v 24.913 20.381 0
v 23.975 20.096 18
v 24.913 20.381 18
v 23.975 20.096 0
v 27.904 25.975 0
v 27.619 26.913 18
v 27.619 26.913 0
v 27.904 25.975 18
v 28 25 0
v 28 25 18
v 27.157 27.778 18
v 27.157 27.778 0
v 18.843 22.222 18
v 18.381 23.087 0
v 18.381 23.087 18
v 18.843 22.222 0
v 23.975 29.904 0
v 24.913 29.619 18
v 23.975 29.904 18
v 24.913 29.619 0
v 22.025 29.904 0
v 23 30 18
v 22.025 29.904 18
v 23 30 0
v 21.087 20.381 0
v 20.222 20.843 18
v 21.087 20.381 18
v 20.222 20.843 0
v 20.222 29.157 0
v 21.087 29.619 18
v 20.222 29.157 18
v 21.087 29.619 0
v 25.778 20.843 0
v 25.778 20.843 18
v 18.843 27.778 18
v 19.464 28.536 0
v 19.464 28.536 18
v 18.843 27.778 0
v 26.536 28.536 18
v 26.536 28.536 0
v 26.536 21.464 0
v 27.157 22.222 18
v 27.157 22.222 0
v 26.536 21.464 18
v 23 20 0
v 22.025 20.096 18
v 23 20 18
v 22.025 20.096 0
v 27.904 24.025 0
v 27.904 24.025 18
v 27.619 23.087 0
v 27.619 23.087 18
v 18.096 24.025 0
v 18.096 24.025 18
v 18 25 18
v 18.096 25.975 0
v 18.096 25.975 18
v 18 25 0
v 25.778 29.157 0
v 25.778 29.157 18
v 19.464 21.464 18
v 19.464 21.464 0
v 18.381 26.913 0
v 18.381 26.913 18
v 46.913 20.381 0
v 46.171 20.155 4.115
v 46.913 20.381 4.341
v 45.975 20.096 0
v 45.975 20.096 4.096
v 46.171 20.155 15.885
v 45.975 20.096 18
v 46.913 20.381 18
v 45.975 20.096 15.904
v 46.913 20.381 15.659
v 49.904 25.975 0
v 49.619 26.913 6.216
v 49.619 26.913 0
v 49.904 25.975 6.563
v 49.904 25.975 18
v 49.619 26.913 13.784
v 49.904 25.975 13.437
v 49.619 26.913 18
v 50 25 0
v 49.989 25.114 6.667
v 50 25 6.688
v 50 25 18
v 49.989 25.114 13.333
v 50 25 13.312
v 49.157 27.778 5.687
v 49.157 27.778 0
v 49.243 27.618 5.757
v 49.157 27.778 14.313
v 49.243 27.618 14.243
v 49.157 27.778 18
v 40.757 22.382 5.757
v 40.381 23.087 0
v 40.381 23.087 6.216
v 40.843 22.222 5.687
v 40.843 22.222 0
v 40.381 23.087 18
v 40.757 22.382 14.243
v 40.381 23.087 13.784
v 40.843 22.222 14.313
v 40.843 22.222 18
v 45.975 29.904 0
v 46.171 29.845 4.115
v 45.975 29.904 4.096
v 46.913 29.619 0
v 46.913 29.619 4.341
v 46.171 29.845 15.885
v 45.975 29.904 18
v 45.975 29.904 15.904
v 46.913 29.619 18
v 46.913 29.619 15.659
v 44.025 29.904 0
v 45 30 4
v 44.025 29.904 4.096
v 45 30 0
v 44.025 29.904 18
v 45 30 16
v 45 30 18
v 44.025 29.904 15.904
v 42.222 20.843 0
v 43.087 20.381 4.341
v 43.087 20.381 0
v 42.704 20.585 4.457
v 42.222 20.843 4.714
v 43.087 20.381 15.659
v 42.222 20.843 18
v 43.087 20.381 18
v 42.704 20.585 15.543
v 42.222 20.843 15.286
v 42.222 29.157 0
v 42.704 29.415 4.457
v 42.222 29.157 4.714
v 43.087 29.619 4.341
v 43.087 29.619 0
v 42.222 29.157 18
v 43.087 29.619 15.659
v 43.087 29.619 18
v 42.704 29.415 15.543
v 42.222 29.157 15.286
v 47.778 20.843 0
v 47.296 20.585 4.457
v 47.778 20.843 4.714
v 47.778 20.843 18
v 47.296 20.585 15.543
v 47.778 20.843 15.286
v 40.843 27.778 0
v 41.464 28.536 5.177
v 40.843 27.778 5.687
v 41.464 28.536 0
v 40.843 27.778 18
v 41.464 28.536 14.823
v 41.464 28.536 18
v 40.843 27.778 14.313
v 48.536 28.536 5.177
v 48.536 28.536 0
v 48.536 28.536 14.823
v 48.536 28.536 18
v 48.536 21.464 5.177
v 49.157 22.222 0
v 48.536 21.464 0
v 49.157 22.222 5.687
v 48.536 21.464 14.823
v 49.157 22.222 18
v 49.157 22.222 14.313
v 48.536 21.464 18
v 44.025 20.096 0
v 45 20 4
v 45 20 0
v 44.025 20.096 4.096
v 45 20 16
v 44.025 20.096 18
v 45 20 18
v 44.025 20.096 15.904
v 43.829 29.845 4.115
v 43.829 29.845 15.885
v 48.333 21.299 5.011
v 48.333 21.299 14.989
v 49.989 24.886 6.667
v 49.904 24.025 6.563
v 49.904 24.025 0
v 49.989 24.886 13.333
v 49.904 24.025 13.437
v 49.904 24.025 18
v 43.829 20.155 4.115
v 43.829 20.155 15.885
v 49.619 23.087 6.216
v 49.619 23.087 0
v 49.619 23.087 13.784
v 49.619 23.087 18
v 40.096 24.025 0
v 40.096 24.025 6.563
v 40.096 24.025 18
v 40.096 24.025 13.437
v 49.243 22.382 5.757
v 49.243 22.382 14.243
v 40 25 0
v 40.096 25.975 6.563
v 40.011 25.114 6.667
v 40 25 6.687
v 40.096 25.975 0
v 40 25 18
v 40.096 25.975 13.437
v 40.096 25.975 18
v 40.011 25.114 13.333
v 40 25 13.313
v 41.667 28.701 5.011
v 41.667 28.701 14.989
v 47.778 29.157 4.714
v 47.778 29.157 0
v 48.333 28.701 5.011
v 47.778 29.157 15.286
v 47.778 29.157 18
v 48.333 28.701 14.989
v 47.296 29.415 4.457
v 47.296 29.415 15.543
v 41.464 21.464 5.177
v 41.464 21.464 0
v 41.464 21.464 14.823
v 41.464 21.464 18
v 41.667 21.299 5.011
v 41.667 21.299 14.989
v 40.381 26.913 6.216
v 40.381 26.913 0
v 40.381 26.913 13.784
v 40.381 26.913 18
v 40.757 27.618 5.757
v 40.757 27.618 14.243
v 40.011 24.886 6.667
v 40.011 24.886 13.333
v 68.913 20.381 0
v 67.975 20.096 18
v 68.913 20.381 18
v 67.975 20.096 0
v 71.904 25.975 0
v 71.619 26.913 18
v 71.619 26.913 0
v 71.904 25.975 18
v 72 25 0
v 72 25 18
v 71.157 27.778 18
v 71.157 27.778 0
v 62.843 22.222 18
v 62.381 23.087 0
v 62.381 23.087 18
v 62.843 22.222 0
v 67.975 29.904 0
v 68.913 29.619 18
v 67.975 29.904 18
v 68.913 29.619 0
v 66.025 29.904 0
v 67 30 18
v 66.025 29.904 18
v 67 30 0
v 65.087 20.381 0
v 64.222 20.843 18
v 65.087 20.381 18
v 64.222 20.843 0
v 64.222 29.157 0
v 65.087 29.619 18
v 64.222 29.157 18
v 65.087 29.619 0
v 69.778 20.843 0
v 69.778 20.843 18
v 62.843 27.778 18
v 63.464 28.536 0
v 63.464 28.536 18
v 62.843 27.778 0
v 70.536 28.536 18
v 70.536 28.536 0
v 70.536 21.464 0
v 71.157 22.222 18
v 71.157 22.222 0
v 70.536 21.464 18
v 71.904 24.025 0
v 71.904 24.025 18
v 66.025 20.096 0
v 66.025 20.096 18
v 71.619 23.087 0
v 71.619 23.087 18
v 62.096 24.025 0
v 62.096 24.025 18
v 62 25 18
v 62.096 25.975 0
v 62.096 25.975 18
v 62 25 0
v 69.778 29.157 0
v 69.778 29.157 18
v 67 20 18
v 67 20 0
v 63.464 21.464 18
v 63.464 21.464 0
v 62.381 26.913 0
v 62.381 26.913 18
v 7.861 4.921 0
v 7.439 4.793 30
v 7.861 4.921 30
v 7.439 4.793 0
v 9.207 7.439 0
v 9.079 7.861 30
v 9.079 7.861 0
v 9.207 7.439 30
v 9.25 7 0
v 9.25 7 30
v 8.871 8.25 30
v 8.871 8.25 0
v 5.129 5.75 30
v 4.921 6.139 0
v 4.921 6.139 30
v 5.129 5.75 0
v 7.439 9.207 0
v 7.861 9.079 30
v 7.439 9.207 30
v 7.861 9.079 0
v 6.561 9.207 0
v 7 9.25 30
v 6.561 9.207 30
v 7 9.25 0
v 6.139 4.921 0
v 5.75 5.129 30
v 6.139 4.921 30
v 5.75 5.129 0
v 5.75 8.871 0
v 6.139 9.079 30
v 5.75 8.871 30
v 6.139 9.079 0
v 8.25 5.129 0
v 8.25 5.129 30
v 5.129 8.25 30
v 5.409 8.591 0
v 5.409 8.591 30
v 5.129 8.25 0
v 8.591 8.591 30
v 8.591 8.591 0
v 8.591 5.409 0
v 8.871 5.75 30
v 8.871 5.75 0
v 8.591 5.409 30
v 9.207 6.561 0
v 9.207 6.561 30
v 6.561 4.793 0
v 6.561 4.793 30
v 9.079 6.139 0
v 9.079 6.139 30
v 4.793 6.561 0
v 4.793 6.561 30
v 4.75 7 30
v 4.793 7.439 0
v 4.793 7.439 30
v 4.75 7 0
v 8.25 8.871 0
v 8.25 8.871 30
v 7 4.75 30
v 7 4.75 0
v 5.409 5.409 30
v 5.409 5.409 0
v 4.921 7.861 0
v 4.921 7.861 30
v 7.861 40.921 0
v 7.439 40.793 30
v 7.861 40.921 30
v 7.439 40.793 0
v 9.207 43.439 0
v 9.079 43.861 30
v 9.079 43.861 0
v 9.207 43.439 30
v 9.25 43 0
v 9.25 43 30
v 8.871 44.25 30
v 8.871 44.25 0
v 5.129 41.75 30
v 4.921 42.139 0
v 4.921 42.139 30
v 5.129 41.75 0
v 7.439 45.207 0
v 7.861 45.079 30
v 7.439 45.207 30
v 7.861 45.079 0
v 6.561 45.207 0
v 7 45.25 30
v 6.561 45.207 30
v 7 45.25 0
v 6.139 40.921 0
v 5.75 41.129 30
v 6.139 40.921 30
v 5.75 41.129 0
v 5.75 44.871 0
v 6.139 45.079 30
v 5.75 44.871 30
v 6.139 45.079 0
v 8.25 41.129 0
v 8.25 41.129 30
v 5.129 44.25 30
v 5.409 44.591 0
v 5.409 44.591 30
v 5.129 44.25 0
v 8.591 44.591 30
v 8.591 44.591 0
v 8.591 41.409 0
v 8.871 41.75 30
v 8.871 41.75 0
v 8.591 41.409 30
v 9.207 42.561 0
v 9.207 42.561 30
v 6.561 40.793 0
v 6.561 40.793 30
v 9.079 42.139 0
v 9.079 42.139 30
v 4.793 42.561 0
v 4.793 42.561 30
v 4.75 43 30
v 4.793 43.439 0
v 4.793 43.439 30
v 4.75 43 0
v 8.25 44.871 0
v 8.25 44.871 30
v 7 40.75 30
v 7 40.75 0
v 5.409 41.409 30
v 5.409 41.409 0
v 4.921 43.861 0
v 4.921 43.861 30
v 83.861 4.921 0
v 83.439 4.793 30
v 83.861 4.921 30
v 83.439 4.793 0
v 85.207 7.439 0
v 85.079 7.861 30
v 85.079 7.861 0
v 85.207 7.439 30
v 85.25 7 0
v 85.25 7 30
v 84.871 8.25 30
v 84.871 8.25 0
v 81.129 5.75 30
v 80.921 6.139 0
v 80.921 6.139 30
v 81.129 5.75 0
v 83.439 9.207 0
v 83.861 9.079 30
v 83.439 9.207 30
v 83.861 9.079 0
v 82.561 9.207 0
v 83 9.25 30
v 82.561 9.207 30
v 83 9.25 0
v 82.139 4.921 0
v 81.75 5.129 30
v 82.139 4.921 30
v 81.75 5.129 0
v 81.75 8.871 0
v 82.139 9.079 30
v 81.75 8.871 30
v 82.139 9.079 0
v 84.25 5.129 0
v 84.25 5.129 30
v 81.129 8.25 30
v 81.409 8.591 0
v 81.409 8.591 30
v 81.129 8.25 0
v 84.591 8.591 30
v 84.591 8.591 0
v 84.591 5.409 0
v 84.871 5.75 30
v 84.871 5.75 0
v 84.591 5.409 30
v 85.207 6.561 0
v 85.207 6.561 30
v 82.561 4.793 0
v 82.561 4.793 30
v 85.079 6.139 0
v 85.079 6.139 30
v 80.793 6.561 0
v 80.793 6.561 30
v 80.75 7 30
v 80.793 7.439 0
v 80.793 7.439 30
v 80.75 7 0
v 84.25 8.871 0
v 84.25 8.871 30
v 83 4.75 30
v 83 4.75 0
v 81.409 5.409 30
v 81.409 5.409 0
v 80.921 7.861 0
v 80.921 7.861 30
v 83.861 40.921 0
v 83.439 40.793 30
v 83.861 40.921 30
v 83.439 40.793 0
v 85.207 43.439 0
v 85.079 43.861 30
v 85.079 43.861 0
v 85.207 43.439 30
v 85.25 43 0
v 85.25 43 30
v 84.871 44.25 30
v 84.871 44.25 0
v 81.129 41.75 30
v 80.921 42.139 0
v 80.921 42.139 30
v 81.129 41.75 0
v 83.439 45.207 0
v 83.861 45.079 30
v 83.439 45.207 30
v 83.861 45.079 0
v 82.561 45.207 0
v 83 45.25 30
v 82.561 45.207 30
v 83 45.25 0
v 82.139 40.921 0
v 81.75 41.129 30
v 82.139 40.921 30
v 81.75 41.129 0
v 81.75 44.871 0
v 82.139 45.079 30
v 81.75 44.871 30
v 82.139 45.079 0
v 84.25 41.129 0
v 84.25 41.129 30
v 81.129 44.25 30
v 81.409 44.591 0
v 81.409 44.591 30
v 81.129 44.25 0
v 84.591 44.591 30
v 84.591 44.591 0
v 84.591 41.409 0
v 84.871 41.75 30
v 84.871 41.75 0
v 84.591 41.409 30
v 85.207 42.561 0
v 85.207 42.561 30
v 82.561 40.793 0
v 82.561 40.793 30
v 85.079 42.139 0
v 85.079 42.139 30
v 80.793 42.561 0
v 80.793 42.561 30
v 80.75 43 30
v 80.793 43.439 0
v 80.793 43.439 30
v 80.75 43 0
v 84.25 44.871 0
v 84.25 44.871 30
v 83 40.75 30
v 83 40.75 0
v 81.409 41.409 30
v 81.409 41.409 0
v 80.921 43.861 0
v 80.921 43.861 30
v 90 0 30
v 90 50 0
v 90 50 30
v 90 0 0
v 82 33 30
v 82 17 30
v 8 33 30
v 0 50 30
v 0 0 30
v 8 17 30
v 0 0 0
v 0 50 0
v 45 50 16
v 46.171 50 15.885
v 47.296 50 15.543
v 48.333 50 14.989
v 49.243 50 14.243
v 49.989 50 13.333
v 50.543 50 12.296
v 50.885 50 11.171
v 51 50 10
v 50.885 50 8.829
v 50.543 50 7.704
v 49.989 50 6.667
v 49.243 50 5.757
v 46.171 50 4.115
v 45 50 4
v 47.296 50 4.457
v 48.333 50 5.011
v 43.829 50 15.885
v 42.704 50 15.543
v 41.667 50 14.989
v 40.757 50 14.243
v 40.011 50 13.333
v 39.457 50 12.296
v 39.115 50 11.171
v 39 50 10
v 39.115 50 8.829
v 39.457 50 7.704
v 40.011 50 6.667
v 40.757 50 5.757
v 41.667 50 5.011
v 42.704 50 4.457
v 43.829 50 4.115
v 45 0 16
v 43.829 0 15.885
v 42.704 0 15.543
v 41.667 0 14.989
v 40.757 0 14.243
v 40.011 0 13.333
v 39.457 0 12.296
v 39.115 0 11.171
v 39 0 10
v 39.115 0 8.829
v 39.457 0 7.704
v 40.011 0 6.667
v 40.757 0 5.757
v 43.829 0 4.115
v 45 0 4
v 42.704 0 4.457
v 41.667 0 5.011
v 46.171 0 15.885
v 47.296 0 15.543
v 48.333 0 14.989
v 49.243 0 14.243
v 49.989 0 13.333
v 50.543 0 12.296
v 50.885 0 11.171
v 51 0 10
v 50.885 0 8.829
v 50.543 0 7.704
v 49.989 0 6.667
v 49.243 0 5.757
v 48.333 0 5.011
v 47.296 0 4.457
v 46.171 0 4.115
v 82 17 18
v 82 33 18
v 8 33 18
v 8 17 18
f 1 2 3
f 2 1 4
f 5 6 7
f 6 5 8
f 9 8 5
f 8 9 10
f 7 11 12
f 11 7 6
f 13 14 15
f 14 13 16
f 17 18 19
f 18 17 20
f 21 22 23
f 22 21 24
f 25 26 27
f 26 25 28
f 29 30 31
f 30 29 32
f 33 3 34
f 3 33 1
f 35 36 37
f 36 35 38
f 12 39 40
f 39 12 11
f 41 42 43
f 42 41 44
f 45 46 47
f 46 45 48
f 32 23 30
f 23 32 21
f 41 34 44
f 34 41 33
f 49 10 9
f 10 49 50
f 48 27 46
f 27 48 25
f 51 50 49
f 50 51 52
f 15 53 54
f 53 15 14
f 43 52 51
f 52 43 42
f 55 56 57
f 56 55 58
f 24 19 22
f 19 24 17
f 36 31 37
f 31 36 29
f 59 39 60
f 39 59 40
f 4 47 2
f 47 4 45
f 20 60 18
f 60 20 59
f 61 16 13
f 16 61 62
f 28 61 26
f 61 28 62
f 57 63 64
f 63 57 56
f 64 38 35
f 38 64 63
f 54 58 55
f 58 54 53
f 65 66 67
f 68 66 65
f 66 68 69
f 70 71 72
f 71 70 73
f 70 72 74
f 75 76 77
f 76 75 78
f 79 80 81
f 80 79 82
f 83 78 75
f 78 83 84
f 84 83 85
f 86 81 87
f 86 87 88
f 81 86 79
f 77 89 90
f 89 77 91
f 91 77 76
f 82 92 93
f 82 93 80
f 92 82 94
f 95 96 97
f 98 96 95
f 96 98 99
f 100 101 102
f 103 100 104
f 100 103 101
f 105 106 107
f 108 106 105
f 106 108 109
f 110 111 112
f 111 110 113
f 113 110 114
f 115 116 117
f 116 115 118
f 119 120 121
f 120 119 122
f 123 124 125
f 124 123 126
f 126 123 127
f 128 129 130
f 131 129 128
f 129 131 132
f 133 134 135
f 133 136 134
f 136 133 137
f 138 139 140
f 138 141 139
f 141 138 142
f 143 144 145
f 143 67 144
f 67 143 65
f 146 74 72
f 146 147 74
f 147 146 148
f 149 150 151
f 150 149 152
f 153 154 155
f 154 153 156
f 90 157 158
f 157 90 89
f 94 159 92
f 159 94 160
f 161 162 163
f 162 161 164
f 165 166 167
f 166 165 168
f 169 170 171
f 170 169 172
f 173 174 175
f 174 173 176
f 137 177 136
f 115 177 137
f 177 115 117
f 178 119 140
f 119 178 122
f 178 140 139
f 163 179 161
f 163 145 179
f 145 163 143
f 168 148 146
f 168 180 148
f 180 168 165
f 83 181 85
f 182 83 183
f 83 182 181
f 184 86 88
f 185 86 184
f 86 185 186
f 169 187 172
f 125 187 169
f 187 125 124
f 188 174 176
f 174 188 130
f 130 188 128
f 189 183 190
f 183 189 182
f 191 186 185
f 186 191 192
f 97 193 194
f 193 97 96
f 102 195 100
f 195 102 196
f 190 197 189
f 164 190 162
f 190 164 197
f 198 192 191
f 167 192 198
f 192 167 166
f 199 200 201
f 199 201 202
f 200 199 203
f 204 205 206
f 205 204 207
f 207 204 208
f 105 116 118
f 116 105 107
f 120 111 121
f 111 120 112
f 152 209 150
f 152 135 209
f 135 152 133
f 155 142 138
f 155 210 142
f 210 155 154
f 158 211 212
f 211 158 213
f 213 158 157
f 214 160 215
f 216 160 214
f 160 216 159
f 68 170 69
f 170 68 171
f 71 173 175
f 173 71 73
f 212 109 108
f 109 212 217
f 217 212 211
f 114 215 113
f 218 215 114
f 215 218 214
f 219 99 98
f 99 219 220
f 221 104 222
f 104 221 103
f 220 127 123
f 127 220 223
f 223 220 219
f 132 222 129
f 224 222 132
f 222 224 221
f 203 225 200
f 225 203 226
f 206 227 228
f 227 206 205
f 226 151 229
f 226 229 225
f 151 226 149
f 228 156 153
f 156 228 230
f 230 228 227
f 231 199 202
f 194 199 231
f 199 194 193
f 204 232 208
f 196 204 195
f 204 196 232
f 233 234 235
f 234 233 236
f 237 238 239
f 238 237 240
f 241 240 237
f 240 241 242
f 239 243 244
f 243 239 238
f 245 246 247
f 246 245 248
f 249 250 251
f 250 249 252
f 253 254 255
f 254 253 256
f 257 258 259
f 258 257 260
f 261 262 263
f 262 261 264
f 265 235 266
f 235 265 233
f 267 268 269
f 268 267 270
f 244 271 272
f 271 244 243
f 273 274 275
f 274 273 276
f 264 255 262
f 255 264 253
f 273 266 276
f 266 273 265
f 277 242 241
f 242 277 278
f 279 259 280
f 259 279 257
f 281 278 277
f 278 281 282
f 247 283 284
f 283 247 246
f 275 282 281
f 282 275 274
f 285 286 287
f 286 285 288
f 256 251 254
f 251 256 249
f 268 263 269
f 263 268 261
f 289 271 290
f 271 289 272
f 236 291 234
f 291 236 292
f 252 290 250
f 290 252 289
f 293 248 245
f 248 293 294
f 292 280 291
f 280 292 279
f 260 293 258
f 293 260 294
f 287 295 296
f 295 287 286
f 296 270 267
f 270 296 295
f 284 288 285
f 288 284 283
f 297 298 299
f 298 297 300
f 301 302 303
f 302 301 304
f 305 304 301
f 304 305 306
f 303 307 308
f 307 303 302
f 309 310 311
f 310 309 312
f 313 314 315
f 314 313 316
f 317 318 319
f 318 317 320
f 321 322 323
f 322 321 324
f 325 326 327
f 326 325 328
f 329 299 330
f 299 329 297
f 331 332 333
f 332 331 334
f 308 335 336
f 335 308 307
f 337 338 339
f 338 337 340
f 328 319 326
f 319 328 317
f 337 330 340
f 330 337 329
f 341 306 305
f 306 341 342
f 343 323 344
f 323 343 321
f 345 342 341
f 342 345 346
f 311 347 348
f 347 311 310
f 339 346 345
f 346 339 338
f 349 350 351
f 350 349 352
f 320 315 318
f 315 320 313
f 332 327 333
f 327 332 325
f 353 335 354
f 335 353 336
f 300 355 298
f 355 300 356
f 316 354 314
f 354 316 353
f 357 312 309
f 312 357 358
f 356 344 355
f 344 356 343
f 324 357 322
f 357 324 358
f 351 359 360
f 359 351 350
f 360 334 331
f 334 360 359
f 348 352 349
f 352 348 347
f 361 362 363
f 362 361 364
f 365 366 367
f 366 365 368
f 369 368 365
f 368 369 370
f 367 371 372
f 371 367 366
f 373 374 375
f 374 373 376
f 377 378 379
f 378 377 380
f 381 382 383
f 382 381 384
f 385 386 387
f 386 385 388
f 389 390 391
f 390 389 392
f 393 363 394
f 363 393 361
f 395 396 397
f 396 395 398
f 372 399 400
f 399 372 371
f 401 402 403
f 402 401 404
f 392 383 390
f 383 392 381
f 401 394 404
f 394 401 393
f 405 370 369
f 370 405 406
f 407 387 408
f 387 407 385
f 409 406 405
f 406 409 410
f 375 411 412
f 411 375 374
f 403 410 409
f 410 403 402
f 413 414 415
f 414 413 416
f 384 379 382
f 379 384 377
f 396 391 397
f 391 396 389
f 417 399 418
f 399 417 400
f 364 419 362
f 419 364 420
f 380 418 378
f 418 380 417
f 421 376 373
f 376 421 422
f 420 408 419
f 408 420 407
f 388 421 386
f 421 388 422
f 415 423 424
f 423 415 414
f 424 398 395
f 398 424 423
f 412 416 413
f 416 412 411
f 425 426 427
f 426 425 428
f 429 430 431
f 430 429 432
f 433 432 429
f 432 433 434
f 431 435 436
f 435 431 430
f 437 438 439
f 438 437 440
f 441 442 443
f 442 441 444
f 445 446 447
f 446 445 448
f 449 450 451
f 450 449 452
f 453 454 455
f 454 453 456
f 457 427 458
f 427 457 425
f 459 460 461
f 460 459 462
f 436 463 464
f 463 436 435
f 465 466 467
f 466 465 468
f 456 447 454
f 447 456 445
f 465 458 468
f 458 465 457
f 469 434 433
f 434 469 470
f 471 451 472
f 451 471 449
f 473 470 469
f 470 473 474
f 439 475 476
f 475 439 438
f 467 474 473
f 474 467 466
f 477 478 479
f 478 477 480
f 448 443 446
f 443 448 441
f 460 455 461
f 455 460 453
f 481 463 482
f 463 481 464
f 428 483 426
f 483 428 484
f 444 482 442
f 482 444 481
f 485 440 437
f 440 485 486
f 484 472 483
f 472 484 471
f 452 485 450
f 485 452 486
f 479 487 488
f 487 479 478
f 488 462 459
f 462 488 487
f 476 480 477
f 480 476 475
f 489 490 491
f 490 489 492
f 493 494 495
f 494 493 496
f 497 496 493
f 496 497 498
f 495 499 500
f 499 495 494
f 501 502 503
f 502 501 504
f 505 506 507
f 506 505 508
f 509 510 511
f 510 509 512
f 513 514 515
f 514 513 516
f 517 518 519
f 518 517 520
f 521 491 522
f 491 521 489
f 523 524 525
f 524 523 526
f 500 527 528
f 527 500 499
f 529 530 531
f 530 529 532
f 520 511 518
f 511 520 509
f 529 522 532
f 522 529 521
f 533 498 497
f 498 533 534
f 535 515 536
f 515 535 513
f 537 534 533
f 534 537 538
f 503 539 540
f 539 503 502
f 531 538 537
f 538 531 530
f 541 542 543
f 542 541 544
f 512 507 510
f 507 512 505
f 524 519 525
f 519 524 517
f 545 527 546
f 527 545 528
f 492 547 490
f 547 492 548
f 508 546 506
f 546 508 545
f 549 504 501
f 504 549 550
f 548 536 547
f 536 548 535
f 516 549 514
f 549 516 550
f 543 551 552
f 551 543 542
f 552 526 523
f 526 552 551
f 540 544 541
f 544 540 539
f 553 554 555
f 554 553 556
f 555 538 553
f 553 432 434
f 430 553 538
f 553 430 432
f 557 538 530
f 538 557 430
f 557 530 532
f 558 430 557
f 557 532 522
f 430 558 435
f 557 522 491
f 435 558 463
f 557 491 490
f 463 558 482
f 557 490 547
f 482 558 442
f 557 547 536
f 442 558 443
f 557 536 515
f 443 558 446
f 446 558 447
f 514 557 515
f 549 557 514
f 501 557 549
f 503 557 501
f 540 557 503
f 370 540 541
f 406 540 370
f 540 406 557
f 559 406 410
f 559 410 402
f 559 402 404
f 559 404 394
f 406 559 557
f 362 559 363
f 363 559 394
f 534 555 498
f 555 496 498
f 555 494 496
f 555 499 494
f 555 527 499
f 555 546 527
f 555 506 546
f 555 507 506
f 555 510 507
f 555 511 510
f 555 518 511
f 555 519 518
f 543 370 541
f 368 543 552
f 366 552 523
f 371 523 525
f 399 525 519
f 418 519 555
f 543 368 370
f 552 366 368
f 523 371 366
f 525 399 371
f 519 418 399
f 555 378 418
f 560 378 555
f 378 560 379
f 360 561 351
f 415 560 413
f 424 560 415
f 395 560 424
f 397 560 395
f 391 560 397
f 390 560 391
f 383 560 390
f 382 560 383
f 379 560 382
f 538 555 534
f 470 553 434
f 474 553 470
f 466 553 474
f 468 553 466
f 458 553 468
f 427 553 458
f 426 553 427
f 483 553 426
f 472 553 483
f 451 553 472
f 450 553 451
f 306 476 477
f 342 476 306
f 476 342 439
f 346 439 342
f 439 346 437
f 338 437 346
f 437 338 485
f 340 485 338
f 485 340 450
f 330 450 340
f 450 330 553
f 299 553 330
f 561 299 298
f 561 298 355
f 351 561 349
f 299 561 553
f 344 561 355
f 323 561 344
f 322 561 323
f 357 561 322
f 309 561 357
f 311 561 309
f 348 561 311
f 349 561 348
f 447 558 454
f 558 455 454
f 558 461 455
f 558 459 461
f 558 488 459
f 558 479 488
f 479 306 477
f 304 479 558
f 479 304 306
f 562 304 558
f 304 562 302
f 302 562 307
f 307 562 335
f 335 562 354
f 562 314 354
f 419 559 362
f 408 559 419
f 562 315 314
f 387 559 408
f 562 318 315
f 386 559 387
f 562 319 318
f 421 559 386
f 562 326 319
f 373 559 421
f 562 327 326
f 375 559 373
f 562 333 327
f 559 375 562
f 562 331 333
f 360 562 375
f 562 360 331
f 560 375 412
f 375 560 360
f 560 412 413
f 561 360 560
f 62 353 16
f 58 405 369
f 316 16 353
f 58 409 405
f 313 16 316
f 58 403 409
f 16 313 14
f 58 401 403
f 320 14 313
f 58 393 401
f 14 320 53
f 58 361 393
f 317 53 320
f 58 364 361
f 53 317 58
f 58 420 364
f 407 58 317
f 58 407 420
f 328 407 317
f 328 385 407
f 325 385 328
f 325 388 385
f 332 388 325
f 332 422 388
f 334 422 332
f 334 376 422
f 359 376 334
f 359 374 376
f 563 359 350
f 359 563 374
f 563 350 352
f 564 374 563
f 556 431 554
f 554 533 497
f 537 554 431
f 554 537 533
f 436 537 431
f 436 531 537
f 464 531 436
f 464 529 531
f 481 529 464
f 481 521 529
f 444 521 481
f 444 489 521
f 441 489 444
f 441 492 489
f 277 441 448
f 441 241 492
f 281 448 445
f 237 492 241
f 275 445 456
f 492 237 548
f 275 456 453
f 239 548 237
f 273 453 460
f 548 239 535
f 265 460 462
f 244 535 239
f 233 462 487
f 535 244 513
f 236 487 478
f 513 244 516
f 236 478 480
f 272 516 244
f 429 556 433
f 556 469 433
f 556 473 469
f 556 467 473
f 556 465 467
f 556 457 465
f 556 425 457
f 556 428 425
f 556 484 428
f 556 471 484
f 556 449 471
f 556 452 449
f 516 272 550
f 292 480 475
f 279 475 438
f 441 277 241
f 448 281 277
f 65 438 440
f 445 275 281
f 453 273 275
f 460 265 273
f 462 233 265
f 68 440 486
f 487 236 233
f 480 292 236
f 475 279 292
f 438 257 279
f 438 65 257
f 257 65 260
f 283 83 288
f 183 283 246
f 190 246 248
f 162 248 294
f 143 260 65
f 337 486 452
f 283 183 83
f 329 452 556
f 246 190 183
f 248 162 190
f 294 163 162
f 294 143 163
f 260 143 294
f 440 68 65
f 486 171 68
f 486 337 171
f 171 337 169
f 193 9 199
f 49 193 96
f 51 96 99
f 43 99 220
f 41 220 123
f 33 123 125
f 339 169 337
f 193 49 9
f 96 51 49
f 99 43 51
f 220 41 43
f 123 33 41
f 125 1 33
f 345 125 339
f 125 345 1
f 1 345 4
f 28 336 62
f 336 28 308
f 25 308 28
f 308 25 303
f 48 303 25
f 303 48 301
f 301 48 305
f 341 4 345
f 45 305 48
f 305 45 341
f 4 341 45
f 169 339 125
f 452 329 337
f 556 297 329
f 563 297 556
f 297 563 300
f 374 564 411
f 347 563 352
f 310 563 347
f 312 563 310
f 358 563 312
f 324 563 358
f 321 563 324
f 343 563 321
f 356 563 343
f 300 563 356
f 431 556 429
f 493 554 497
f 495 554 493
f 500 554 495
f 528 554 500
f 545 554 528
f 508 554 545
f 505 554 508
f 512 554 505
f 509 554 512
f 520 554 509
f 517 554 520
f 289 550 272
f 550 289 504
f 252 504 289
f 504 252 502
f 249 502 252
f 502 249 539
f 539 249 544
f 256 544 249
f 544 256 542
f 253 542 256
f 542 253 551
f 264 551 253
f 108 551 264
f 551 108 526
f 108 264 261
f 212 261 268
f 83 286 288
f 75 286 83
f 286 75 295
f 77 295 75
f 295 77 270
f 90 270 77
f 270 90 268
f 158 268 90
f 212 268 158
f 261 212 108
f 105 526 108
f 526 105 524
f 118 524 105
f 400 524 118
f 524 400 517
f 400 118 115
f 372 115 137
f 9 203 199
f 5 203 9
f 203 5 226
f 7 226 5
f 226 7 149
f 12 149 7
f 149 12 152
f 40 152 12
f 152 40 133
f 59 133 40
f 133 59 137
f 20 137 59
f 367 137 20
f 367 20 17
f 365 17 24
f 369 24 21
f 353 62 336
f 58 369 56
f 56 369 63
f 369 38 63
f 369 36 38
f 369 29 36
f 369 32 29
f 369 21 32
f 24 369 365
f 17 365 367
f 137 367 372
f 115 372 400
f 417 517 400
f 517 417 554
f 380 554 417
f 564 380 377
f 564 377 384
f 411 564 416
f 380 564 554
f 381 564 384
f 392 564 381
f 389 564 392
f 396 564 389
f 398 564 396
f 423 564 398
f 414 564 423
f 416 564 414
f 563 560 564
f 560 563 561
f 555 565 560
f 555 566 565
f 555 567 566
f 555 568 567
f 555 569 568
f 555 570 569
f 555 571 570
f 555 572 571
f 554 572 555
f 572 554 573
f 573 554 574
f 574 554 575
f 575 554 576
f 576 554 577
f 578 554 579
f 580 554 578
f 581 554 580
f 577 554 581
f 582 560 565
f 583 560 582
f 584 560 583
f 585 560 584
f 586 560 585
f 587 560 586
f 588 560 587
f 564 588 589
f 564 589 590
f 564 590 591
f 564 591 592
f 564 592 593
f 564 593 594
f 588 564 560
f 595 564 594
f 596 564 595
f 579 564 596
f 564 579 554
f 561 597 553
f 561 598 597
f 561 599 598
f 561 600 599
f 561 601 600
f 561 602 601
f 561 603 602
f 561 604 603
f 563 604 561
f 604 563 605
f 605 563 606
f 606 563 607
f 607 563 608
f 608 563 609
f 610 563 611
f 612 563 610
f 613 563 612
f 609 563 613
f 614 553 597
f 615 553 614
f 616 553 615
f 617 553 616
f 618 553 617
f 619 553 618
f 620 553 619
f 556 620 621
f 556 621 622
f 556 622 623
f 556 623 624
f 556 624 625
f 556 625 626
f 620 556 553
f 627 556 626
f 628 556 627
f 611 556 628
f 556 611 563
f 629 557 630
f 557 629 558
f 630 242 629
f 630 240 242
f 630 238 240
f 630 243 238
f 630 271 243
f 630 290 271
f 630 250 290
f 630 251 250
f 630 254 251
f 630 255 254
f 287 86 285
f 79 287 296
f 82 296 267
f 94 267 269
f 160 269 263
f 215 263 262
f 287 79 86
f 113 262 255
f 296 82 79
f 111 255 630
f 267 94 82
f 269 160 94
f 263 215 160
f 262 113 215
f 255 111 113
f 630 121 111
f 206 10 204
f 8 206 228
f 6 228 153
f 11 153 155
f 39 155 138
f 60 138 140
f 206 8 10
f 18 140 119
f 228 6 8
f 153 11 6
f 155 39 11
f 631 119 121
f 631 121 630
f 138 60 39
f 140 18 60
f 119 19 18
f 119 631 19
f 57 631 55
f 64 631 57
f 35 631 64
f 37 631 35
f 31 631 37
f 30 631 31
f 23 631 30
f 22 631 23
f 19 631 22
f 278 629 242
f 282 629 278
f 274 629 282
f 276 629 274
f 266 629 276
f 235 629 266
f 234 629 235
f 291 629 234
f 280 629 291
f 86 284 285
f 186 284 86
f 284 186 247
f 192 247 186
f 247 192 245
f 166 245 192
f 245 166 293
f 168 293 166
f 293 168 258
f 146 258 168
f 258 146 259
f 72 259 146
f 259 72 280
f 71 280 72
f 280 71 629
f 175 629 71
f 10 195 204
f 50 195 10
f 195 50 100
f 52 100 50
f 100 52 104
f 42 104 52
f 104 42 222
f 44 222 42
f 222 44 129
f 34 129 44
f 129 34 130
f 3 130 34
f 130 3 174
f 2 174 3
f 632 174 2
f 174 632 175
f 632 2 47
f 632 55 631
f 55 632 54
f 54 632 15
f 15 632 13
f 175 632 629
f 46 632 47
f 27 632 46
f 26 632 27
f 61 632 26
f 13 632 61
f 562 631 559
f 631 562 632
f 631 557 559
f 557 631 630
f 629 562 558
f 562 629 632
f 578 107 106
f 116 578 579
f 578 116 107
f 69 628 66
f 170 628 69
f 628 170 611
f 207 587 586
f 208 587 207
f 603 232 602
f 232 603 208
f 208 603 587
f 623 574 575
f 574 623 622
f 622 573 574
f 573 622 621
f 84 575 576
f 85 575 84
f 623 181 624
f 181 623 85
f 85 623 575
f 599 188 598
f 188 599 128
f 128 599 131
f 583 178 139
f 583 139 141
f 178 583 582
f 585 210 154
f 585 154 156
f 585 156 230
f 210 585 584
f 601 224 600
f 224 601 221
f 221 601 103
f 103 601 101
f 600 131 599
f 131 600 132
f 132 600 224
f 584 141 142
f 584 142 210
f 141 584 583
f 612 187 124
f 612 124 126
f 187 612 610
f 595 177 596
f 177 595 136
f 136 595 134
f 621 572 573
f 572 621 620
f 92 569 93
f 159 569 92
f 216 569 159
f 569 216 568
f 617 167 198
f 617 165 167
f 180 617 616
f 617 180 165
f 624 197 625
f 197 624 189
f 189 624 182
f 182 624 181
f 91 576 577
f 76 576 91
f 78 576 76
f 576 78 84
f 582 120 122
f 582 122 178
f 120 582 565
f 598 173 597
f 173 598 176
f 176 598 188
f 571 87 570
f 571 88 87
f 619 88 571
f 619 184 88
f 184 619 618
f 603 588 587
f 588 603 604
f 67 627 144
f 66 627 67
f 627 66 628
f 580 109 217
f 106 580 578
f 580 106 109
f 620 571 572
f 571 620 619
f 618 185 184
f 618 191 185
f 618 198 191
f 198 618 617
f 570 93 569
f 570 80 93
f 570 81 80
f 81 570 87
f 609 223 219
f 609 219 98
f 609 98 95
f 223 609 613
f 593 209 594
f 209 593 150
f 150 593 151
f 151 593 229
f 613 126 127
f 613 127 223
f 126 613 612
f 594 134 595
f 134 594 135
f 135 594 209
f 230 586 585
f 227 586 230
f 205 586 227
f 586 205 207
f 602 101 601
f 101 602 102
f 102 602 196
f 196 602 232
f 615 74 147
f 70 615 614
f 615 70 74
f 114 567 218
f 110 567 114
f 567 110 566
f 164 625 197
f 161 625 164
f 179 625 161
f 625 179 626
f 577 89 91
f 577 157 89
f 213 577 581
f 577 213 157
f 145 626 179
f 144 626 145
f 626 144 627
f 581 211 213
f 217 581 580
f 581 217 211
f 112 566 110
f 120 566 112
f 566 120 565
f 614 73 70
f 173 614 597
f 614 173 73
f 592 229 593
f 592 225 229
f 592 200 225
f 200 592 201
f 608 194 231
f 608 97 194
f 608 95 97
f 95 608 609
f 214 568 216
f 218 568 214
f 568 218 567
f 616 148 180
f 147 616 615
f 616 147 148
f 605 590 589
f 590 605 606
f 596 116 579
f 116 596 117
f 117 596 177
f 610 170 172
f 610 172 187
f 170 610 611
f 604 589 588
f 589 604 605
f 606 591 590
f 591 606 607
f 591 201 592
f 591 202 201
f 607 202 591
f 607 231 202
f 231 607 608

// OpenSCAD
$fn = 32;

// ----------------------------------------------------------------------
// Manifold block: side_outlet manifold
// ----------------------------------------------------------------------

// --- parameters (mm) ---
block_l = 90;             // block length, X
block_w = 50;             // block width, Y
block_h = 30;             // block height, Z
port_d = 10;              // port bore diameter
port_pitch = 22;          // port pitch along X
gallery_d = 16;           // top gallery width, Y
gallery_depth = 12;       // gallery pocket depth
wall_p = 8;               // gallery end wall thickness, X
mnt_d = 4.5;              // mounting hole diameter
mnt_in = 7;               // mounting hole inset from the edges
out_d = 12;               // outlet bore diameter
out_z = 10;               // outlet axis height

n_ports = 3;  // ports in the row
port_x0 = (block_l - (n_ports - 1) * port_pitch) / 2;  // first port X

difference() {
  cube([block_l, block_w, block_h]);
  for (i = [0 : n_ports - 1])
    translate([port_x0 + i * port_pitch, block_w / 2, -1])
      cylinder(h = block_h + 2, d = port_d);
  translate([wall_p, block_w / 2 - gallery_d / 2, block_h - gallery_depth])
    cube([block_l - 2 * wall_p, gallery_d, gallery_depth + 1]);
  for (cx = [mnt_in, block_l - mnt_in])
    for (cy = [mnt_in, block_w - mnt_in])
      translate([cx, cy, -1]) cylinder(h = block_h + 2, d = mnt_d);
  translate([block_l / 2, -1, out_z]) rotate([-90, 0, 0])
    cylinder(h = block_w + 2, d = out_d);
}
